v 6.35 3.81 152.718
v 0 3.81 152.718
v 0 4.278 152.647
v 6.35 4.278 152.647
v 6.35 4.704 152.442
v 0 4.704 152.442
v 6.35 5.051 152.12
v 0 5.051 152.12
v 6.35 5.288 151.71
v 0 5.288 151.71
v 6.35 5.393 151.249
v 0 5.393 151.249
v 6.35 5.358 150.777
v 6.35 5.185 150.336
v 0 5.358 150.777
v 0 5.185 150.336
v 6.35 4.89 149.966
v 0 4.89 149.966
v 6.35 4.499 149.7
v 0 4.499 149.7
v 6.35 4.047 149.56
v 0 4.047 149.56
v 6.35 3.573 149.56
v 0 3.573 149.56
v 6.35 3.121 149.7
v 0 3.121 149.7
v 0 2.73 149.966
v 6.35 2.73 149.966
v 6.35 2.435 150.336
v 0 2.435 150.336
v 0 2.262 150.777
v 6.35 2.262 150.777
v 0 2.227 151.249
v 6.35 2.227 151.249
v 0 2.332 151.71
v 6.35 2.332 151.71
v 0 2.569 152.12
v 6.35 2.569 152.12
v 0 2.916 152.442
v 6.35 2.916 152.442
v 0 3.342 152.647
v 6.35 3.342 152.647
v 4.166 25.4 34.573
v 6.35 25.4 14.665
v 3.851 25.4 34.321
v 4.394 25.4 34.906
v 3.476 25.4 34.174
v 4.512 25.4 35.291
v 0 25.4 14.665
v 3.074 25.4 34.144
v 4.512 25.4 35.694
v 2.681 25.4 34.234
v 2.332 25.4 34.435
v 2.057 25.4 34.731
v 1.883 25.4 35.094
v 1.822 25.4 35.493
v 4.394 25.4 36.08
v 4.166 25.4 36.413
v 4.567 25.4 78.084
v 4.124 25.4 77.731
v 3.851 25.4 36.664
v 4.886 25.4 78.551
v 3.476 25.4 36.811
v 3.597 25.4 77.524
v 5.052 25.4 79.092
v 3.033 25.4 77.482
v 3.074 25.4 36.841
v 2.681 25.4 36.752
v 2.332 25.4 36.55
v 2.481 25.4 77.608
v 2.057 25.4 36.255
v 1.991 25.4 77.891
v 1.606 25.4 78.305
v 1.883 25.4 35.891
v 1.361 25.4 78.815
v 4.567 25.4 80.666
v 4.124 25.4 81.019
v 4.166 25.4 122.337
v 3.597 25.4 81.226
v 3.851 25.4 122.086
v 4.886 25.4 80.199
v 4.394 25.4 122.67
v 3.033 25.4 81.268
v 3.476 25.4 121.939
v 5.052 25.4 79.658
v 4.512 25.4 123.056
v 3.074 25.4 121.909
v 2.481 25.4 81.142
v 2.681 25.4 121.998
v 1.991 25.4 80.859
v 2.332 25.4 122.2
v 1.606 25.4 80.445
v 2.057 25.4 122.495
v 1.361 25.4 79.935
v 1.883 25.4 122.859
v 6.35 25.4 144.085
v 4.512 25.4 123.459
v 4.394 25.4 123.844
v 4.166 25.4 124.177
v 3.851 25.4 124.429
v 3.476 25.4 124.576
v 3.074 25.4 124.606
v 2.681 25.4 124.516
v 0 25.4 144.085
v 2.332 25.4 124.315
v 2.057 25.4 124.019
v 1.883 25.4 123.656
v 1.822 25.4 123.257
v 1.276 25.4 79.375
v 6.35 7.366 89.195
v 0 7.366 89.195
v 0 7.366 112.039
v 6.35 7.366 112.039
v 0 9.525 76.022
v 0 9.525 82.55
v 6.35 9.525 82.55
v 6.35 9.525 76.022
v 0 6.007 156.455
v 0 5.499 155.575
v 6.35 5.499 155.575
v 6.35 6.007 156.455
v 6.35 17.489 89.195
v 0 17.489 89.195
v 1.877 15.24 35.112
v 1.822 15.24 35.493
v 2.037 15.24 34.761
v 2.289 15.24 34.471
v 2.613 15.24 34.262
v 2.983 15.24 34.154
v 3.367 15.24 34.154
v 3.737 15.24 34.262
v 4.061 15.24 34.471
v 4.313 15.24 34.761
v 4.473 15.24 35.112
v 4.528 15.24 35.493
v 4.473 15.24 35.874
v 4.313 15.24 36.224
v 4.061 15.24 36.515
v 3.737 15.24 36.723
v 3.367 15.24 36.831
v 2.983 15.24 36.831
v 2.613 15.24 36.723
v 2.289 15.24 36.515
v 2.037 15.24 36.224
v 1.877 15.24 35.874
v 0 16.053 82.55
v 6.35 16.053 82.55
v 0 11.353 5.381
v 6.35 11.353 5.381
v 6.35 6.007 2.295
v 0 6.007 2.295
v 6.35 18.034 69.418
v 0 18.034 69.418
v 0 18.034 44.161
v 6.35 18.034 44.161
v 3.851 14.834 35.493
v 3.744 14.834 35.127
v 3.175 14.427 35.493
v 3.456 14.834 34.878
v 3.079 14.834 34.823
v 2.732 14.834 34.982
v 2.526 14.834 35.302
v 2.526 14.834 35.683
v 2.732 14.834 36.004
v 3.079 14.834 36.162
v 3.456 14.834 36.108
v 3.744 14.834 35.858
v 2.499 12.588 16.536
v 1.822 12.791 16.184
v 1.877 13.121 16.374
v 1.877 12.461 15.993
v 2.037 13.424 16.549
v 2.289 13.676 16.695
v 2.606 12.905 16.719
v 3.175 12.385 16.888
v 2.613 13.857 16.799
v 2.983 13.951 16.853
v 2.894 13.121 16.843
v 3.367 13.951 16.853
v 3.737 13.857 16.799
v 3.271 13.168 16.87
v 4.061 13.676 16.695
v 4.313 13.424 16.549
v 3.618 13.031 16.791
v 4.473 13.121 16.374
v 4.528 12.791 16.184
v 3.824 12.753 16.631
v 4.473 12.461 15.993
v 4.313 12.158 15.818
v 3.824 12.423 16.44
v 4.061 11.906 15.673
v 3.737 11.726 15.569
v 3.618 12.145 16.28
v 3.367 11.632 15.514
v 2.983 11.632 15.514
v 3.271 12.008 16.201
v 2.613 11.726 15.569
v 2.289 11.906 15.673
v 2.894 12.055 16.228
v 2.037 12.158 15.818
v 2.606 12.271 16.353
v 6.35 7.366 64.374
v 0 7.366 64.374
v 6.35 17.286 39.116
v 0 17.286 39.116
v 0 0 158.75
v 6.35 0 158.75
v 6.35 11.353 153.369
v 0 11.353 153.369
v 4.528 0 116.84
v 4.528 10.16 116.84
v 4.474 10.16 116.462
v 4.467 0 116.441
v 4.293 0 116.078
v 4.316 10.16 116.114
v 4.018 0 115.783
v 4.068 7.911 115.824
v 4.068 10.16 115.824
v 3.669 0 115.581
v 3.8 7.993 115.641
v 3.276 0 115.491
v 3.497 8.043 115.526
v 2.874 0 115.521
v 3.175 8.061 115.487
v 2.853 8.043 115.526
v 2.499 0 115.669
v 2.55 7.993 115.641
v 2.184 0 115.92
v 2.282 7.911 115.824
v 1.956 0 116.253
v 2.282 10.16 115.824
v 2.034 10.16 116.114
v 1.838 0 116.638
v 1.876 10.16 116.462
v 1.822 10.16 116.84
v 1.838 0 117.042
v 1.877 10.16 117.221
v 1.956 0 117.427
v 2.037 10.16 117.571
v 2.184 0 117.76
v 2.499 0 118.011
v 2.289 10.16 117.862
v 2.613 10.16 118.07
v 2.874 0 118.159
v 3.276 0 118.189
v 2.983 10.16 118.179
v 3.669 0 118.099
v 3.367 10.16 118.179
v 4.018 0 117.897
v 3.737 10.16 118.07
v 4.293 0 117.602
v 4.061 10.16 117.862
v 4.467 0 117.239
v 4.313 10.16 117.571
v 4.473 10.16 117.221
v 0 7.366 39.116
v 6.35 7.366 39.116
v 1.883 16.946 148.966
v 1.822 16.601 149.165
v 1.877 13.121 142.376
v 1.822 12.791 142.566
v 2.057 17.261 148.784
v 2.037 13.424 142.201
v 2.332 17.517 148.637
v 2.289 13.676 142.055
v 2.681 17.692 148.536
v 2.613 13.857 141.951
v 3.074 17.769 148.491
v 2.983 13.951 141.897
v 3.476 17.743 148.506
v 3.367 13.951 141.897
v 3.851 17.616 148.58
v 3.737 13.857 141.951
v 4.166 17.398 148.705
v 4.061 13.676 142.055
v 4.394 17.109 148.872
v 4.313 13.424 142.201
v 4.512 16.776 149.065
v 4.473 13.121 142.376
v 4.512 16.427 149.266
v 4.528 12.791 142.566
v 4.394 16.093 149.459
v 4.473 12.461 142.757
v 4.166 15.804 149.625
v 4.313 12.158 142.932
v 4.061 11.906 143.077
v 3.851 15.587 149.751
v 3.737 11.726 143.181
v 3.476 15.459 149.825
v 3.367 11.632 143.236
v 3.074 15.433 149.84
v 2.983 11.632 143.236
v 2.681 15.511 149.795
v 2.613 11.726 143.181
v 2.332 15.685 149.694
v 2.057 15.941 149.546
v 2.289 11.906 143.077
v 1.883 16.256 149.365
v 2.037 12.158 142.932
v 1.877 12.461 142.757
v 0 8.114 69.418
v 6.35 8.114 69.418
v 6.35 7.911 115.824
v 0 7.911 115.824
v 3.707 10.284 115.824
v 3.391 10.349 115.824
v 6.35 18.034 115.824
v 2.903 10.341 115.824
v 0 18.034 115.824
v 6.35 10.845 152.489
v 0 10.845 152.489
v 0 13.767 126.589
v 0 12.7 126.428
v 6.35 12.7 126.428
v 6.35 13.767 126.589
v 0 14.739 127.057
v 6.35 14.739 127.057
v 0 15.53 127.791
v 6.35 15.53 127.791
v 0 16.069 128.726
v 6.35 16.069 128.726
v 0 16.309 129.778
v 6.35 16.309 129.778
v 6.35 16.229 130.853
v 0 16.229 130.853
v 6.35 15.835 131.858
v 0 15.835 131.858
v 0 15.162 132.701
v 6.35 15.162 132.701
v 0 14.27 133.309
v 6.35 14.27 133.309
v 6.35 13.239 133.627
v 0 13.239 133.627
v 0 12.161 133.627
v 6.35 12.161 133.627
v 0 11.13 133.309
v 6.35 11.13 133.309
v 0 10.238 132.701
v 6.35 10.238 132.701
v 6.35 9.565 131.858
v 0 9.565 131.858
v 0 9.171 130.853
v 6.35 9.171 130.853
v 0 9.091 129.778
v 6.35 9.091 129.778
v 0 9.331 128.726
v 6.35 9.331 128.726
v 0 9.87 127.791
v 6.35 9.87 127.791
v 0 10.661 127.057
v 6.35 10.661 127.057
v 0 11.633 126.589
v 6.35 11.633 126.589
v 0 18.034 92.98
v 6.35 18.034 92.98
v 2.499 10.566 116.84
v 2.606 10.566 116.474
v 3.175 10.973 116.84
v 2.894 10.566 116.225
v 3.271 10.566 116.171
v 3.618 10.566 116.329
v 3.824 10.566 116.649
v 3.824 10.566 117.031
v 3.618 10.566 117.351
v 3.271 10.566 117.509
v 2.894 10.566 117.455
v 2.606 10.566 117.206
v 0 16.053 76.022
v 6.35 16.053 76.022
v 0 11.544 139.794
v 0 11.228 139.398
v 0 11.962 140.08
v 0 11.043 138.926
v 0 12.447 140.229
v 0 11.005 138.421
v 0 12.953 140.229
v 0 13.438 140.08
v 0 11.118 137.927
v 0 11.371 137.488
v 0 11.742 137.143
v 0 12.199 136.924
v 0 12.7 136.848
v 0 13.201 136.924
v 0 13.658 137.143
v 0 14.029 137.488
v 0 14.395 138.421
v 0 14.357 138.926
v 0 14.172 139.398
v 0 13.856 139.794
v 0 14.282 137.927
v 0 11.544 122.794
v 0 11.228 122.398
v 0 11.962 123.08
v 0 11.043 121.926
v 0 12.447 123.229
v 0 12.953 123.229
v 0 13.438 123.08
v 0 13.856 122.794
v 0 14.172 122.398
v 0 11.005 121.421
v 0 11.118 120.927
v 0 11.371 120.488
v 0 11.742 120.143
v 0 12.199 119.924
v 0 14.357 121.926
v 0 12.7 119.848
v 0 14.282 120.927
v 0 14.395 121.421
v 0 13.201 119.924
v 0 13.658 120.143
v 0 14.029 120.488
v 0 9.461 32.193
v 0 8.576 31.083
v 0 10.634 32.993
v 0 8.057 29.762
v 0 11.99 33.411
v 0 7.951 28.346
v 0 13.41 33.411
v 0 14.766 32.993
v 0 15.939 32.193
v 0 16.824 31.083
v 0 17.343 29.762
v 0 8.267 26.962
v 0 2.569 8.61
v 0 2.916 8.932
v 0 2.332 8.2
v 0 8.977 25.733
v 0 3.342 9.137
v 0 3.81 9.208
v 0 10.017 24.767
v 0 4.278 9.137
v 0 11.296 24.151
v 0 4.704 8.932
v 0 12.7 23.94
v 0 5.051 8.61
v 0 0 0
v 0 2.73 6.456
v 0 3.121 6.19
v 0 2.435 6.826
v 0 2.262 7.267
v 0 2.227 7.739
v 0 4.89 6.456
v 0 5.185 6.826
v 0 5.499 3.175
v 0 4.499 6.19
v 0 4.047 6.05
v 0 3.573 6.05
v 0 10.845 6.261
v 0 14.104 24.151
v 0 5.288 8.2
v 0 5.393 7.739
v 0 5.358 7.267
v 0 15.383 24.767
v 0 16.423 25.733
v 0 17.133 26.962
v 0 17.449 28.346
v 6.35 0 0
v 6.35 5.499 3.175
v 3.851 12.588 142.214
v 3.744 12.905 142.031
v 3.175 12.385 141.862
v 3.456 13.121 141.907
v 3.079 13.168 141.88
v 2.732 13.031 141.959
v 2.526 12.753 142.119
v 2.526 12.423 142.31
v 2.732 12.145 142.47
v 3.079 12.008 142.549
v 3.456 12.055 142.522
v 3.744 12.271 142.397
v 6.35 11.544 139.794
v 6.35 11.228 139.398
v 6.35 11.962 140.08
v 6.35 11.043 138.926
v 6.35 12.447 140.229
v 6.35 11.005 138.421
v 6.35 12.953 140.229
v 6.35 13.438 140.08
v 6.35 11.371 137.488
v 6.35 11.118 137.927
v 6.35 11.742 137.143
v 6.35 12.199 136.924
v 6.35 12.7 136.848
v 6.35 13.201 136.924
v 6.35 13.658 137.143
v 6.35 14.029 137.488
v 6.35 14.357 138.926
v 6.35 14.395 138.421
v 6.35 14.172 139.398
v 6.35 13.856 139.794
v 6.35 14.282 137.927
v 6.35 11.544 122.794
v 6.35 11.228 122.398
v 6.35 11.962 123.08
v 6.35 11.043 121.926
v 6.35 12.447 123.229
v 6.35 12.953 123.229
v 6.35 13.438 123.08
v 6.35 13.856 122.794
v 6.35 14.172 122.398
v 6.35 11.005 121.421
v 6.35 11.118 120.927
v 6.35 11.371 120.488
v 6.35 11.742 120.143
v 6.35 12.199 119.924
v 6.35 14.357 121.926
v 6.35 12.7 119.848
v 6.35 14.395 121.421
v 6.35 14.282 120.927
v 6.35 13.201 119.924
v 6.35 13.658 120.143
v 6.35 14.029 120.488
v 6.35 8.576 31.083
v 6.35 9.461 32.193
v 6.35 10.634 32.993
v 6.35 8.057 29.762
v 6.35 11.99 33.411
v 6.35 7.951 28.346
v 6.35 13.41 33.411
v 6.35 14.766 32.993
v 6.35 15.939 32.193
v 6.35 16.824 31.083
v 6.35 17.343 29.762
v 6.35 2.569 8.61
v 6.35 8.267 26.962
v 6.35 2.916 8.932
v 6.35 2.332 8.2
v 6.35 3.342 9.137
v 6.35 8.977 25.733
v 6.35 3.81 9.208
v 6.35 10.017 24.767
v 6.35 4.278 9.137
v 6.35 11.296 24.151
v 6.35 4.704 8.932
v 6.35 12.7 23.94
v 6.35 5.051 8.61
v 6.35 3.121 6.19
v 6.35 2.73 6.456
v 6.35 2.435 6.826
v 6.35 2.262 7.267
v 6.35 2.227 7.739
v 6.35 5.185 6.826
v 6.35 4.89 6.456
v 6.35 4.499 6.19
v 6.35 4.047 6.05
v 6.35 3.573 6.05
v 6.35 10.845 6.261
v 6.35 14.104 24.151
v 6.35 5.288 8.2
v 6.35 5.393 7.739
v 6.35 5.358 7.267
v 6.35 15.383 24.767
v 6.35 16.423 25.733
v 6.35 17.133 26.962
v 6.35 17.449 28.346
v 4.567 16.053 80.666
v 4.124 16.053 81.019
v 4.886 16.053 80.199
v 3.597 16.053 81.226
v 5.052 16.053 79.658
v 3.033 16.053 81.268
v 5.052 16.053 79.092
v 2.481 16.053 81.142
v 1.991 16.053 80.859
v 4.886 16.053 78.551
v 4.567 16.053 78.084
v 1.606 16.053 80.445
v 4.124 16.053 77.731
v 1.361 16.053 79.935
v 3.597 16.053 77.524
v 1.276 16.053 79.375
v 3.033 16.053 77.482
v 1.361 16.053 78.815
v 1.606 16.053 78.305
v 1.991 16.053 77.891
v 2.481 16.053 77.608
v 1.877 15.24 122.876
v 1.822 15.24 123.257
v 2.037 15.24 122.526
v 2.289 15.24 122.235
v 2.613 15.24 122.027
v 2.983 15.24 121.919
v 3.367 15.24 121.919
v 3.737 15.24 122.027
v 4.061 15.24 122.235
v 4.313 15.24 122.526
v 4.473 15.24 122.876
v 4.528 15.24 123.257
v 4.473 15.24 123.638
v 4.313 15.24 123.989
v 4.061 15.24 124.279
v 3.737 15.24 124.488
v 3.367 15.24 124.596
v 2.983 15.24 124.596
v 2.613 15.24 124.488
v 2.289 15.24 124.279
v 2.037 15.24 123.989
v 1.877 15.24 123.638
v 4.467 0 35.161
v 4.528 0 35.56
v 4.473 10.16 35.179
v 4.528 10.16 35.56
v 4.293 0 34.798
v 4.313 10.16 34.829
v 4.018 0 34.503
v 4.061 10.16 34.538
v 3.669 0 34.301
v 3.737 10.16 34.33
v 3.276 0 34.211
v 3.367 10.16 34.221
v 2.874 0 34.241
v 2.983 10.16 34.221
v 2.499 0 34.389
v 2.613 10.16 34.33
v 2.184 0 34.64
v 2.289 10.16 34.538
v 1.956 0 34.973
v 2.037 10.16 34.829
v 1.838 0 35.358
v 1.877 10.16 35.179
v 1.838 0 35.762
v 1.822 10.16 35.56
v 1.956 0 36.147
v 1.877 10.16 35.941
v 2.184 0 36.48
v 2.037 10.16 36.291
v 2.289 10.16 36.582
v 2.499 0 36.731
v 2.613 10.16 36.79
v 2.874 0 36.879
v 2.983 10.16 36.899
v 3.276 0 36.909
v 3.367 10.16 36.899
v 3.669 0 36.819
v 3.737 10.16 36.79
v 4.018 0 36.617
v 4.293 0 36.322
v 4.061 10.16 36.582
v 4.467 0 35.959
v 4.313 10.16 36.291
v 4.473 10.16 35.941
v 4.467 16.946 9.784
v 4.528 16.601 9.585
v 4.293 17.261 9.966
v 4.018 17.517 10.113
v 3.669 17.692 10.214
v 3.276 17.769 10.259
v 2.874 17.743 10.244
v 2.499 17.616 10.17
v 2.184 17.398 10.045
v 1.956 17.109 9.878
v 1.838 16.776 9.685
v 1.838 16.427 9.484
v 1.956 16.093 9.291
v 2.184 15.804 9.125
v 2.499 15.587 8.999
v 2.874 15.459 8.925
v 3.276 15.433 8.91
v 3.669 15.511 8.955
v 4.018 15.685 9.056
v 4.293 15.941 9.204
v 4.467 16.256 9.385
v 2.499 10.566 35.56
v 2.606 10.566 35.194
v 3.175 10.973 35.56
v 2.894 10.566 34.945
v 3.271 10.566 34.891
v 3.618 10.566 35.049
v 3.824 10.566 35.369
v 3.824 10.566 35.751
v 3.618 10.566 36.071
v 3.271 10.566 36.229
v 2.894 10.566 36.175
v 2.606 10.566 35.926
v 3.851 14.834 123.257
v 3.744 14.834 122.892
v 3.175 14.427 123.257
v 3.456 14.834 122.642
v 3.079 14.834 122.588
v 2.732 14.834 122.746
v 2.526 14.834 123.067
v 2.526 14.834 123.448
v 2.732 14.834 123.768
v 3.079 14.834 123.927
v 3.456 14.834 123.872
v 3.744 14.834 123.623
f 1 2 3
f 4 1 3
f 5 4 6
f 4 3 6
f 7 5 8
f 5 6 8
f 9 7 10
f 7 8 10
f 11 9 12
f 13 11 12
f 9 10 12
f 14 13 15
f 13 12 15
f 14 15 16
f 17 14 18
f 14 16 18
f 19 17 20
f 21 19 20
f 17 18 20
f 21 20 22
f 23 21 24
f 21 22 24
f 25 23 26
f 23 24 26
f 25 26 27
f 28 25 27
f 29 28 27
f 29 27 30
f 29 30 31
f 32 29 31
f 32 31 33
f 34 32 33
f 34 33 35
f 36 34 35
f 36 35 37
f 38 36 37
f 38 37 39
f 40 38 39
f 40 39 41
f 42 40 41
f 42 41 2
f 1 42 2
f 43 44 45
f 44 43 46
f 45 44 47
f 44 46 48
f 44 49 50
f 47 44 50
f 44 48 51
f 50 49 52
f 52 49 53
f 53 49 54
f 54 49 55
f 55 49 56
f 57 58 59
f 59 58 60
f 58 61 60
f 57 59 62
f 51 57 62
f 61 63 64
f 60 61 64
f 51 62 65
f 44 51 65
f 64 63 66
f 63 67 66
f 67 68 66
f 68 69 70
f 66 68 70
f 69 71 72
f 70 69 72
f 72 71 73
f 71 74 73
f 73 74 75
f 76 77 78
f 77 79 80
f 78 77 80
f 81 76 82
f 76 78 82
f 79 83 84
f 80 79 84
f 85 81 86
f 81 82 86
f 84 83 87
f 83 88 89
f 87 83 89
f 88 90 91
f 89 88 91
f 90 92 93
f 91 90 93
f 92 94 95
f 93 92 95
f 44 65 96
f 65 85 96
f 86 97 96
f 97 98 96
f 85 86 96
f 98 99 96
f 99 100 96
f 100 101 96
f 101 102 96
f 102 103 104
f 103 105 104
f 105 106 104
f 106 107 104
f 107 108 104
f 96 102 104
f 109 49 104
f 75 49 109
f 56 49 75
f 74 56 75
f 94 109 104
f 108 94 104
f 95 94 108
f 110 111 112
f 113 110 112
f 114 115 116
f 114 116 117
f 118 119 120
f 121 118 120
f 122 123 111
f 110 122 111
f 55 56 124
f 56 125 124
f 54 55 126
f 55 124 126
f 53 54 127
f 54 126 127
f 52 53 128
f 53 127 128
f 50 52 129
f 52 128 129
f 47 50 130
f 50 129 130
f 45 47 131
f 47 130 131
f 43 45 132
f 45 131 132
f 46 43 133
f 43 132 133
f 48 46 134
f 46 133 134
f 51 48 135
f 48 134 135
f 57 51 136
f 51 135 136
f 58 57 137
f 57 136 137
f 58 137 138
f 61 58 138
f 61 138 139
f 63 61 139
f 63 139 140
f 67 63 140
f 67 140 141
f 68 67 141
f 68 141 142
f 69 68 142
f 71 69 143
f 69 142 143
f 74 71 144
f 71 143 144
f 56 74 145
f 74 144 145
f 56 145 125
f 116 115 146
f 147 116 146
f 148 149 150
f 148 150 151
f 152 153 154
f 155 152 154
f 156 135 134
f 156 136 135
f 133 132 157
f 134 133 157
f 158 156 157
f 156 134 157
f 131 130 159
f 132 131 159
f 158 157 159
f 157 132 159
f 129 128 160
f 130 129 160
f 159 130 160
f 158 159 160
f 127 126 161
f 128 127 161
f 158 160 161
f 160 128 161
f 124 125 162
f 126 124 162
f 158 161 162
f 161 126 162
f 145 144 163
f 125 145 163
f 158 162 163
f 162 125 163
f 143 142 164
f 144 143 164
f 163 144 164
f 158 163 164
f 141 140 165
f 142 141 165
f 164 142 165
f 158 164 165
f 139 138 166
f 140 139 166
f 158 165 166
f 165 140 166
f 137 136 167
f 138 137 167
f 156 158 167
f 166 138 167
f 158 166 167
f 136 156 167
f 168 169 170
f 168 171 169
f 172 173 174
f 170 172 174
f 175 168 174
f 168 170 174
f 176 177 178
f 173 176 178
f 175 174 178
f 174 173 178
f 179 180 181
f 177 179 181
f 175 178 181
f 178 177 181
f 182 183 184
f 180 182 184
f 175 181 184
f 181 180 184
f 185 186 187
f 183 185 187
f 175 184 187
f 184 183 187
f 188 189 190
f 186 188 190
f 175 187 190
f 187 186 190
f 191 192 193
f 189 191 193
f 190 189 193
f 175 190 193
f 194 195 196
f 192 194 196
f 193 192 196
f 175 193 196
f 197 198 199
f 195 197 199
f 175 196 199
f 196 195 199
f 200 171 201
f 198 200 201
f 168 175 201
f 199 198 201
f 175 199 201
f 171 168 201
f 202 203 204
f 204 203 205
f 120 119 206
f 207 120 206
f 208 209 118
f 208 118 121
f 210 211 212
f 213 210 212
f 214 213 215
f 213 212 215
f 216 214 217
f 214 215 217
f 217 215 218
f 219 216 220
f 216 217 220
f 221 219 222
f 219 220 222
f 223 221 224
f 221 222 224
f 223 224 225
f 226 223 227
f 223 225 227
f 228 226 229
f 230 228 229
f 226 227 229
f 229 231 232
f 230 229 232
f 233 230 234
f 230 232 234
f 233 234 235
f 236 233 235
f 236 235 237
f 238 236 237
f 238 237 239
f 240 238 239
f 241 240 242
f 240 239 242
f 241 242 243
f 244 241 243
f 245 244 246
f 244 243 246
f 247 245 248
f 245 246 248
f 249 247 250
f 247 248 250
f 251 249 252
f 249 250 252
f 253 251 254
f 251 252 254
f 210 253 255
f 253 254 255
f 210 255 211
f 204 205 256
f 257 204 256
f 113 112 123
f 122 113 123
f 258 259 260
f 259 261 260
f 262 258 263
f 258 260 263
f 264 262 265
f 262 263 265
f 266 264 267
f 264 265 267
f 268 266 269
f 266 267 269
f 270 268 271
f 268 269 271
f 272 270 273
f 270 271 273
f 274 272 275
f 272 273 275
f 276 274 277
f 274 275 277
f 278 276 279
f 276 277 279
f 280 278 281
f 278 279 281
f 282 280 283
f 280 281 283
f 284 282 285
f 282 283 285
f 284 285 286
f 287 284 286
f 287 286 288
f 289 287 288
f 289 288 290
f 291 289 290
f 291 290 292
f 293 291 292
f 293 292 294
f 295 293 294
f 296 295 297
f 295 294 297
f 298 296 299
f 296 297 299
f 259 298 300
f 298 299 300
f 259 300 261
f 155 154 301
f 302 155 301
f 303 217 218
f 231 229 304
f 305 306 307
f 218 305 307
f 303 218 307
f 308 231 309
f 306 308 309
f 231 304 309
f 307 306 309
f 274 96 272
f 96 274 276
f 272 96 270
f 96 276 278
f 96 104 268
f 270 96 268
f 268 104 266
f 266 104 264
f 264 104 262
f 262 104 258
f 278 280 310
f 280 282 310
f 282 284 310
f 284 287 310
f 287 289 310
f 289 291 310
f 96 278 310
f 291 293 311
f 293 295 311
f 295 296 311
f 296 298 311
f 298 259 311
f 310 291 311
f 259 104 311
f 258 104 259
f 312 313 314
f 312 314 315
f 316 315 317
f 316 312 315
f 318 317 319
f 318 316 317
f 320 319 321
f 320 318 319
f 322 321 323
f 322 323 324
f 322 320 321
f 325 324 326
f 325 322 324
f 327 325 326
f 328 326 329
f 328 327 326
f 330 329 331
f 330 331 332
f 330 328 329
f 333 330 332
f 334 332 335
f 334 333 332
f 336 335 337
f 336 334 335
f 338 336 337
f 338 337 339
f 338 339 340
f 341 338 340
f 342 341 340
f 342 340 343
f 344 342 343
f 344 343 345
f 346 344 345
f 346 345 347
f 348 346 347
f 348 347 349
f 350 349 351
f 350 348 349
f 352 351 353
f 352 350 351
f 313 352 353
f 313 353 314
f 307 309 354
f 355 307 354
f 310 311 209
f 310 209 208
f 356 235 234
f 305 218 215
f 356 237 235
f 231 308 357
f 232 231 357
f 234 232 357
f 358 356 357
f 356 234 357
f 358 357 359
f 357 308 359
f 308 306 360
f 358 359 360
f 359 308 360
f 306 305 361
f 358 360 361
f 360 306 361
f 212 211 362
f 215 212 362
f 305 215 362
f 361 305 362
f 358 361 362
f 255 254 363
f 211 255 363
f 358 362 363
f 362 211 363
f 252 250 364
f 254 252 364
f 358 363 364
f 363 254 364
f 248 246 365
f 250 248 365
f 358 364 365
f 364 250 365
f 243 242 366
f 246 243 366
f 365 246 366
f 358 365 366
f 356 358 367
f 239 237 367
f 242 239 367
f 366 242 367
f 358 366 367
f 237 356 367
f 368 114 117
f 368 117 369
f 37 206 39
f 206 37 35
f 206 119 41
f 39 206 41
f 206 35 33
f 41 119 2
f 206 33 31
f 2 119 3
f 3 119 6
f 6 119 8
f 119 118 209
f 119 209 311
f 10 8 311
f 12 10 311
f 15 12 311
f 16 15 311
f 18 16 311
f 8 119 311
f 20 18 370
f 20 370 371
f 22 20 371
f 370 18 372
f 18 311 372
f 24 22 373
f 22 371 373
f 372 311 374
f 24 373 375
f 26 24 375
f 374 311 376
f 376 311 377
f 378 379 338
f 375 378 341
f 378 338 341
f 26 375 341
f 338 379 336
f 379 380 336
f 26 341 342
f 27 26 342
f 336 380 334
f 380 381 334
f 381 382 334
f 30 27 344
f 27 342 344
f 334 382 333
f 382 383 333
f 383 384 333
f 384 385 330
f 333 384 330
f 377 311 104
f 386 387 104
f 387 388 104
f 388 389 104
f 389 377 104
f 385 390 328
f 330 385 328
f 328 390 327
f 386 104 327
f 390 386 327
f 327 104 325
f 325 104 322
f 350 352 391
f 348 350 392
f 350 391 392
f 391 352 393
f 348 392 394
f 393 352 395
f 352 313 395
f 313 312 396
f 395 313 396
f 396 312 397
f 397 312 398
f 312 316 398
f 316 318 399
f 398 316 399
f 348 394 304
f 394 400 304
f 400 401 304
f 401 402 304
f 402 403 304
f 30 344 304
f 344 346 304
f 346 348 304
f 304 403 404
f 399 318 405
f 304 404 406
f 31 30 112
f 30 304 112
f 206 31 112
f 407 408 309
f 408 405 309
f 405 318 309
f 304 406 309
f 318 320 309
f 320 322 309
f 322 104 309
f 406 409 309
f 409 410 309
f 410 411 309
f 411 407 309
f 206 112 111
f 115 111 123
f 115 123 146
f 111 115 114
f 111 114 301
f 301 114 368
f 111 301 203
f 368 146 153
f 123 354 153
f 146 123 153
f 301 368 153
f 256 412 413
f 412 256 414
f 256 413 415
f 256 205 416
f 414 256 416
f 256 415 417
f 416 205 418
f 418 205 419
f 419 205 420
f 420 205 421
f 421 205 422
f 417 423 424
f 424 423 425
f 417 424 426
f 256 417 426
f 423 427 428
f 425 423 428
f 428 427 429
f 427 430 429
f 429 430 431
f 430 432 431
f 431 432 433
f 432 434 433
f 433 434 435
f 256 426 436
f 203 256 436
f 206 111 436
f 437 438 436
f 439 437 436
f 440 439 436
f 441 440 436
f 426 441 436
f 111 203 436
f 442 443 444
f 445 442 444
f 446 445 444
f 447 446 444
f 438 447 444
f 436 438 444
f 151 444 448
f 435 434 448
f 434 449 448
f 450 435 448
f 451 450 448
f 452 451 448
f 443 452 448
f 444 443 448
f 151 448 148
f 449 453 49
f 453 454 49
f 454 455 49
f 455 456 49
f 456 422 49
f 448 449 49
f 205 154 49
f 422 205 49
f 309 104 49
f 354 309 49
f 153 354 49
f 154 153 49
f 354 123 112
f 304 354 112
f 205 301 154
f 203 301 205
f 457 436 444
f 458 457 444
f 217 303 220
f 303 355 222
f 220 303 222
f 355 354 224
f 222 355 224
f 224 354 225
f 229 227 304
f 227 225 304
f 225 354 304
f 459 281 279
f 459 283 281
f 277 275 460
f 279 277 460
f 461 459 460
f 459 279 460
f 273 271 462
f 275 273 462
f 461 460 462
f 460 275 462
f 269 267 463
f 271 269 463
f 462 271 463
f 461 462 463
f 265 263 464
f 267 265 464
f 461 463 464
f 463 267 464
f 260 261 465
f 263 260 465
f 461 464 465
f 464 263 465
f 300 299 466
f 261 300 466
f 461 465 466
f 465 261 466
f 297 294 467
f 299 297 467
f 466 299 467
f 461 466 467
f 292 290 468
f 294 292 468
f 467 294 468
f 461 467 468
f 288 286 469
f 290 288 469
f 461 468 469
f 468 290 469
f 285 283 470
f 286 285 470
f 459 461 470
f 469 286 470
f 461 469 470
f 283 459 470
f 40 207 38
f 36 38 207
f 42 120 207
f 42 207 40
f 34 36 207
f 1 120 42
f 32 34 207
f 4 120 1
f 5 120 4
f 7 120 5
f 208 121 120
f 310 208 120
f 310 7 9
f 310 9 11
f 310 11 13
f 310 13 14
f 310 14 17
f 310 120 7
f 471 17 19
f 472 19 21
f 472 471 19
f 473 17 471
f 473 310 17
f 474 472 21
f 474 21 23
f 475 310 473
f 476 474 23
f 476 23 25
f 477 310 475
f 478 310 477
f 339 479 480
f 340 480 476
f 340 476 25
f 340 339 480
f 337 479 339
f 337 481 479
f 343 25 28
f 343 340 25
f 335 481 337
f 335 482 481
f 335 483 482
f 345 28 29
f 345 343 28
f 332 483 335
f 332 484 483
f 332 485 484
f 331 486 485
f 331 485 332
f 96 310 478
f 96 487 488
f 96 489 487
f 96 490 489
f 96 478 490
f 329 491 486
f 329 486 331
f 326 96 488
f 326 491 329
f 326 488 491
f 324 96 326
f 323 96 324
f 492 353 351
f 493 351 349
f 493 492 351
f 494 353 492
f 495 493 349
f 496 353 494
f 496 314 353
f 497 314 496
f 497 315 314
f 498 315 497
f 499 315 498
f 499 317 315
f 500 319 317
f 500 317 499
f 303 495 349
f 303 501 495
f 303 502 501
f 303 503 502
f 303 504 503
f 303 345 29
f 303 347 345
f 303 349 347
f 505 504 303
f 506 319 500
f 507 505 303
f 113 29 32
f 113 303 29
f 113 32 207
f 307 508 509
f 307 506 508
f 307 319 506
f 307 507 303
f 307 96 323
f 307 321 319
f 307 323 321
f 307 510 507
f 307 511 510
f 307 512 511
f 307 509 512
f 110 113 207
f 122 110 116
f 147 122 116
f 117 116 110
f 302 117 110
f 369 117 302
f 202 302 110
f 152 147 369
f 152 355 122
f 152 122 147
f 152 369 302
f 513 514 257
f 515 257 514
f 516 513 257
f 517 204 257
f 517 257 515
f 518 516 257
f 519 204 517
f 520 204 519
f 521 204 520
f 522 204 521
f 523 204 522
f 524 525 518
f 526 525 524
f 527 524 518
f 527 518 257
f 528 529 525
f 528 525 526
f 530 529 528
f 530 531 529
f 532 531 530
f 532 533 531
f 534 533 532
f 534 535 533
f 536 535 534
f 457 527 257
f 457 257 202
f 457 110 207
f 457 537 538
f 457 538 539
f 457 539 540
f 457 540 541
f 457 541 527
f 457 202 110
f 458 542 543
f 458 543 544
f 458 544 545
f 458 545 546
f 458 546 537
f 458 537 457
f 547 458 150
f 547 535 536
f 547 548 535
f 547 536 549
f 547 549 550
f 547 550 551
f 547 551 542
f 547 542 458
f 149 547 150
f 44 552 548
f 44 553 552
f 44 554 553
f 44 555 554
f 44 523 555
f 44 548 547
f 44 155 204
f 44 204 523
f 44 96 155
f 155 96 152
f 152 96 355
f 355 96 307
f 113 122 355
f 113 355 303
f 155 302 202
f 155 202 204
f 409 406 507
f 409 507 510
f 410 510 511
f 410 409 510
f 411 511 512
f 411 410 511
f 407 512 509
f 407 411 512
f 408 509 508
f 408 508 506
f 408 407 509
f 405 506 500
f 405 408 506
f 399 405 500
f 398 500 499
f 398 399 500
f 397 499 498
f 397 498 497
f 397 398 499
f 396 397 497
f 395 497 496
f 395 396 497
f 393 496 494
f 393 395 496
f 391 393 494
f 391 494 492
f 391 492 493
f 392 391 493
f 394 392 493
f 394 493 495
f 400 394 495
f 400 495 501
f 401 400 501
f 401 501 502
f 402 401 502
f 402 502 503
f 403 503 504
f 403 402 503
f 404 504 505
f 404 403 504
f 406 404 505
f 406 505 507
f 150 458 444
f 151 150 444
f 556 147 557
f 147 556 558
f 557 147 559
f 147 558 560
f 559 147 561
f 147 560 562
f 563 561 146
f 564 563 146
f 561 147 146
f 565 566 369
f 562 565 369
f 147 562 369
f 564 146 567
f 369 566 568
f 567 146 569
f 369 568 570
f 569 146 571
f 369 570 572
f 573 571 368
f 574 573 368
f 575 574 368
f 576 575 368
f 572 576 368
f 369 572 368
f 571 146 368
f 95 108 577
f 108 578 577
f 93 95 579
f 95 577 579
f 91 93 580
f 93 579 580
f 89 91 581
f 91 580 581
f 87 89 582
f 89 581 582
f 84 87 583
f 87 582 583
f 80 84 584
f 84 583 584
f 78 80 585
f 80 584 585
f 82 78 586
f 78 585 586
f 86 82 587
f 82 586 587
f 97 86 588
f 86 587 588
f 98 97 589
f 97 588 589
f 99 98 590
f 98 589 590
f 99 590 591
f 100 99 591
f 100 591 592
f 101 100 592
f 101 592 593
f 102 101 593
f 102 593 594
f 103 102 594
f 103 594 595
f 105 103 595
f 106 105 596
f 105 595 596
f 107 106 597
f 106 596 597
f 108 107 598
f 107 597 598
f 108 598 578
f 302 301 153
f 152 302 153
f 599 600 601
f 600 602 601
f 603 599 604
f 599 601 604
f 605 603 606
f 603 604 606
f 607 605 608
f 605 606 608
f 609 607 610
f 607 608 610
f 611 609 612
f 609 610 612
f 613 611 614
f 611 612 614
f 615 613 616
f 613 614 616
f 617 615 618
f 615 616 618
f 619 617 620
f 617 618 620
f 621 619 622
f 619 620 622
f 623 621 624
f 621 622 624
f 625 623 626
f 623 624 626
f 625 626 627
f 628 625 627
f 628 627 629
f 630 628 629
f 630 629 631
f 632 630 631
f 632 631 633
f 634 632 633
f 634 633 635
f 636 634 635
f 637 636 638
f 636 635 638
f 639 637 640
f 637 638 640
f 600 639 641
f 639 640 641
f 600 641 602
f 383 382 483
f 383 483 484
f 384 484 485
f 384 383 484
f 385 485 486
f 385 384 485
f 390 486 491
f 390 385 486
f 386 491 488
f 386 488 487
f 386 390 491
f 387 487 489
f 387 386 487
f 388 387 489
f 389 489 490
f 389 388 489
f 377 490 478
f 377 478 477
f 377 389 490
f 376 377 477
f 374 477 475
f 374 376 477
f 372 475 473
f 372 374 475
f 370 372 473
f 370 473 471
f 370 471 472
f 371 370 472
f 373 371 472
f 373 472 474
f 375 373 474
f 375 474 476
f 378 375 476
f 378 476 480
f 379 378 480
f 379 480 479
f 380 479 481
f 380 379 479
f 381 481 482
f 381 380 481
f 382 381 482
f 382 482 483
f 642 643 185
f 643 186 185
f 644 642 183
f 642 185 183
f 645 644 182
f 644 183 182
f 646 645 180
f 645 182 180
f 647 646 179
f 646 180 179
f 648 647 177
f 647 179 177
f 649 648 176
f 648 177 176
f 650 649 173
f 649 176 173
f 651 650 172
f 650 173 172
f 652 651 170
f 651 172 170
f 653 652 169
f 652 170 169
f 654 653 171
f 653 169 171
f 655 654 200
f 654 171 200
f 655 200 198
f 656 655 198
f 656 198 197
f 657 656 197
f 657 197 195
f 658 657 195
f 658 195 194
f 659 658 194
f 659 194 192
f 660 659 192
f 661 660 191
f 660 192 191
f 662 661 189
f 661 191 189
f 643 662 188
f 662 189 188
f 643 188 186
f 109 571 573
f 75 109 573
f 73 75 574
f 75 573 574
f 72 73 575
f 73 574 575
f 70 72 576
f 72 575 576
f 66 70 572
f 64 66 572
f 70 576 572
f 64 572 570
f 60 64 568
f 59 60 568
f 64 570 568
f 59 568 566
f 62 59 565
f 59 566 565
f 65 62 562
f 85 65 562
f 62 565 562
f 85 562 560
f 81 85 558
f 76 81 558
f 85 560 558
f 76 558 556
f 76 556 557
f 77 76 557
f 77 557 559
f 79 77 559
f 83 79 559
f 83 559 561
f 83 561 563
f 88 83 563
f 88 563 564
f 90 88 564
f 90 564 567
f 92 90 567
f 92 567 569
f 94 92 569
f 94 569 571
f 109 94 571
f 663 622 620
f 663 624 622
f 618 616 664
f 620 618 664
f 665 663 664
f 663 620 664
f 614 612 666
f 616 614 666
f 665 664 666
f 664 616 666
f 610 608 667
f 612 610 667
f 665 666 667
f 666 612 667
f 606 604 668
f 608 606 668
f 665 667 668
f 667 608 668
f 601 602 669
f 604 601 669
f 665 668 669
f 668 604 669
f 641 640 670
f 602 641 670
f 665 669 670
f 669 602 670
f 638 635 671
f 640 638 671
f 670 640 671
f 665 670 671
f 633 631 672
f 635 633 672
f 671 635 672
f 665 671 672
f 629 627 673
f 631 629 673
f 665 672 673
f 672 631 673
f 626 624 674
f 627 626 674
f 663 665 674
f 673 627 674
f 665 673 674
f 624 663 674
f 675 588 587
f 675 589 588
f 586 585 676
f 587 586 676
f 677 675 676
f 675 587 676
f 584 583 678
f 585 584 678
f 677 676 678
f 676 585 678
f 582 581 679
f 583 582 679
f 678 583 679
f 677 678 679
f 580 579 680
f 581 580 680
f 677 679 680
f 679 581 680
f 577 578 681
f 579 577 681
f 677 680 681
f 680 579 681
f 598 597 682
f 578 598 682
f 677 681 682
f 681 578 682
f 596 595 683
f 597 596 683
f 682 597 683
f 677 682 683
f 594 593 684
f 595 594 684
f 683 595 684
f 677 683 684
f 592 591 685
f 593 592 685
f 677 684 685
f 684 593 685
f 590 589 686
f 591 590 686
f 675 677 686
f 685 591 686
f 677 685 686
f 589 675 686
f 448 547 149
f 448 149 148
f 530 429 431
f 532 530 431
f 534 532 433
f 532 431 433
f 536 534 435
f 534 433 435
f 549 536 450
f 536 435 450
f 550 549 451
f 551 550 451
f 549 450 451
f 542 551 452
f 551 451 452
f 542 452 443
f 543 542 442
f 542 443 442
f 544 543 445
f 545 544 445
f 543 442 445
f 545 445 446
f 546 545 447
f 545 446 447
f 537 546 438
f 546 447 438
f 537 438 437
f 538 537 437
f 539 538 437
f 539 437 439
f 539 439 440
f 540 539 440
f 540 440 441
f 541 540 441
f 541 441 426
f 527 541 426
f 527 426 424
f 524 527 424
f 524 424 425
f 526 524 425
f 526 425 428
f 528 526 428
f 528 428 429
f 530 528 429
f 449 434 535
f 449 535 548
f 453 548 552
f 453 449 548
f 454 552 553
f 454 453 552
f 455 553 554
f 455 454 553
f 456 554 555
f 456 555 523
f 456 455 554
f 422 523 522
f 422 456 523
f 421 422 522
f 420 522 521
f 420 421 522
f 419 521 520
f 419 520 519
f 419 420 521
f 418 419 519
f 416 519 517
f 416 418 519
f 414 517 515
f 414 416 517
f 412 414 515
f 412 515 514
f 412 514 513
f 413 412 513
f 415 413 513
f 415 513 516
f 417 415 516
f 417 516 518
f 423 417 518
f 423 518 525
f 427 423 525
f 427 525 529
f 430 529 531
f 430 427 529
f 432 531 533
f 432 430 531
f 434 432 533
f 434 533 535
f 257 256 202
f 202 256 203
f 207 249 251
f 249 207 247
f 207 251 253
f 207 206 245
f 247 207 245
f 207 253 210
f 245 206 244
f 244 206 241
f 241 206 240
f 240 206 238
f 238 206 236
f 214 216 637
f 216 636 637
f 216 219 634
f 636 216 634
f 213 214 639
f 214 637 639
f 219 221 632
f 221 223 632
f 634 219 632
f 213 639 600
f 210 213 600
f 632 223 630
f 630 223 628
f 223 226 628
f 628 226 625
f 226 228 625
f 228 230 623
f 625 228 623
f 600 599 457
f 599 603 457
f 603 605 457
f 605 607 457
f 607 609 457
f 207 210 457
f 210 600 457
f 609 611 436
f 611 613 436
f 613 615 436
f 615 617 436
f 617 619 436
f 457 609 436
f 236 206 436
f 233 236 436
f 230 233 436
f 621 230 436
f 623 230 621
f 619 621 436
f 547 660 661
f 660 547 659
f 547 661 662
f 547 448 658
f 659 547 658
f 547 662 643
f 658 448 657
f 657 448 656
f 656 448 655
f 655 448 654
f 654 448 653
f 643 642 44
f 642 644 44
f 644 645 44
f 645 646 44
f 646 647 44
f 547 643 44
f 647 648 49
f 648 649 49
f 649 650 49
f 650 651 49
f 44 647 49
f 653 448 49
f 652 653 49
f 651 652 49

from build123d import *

# Parameters (mm, degrees)
SKETCH1_R                     = 3.6195
SKETCH1_R_2                   = 4.7625
SKETCH1_R_3                   = 1.6999966
SKETCH1_W                     = 6.5278
SKETCH1_H                     = 6.5278
BOSS_EXTRUDE1_DEPTH           = 6.35
TAP_DRILL_FOR_6_32_TAP4_D     = 2.7051
TAP_DRILL_FOR_6_32_TAP4_DEPTH = 10.16
TAP_DRILL_FOR_6_32_TAP4_TIP   = 0.81269403
TAP_DRILL_FOR_6_32_TAP3_D     = 2.7051
TAP_DRILL_FOR_6_32_TAP3_DEPTH = 10.16
TAP_DRILL_FOR_6_32_TAP3_TIP   = 0.81269403
SKETCH11_W                    = 6.35
SKETCH11_H                    = 6.1722
BOSS_EXTRUDE2_DEPTH           = 1.016
SKETCH12_W                    = 6.35
SKETCH12_H                    = 6.1722
BOSS_EXTRUDE3_DEPTH           = 1.016
TAP_DRILL_FOR_6_32_TAP1_D     = 2.7051
TAP_DRILL_FOR_6_32_TAP1_DEPTH = 7.62
TAP_DRILL_FOR_6_32_TAP1_TIP   = 0.81269403
TAP_DRILL_FOR_6_32_TAP2_D     = 2.7051
TAP_DRILL_FOR_6_32_TAP2_DEPTH = 7.62
TAP_DRILL_FOR_6_32_TAP2_TIP   = 0.81269403
F_6_CLEARANCE_HOLE1_D         = 3.7973
F_6_CLEARANCE_HOLE1_DEPTH     = 12.7
F_6_CLEARANCE_HOLE1_TIP       = 1.140824014
SKETCH19_R                    = 1.5875
CUT_EXTRUDE1_DEPTH            = 161.894515133
CUT_EXTRUDE2_DEPTH            = 161.894515133


with BuildPart() as part:
    # Sketch1 → Boss-Extrude1 (new body)
    with BuildSketch(Plane(origin=(0, 0, 0), x_dir=(0, 0, -1), z_dir=(1, 0, 0))):
        Polygon((0, 0), (-14.664696837, 25.4), (-144.085303163, 25.4), (-158.75, 0), align=None)
        with Locations((-130.048, 12.7)):
            Circle(SKETCH1_R, mode=Mode.SUBTRACT)
        with Locations((-28.702, 12.7)):
            Circle(SKETCH1_R_2, mode=Mode.SUBTRACT)
        with Locations((-121.5479916, 12.7)):
            Circle(SKETCH1_R_3, mode=Mode.SUBTRACT)
        with Locations((-138.5480084, 12.7)):
            Circle(SKETCH1_R_3, mode=Mode.SUBTRACT)
        with Locations((-79.2861, 12.7889)):
            Rectangle(SKETCH1_W, SKETCH1_H, mode=Mode.SUBTRACT)
    extrude(amount=BOSS_EXTRUDE1_DEPTH)

    # Tap Drill for #6-32 Tap4
    with Locations(Plane(origin=(0, 25.4, 0), x_dir=(1, 0, 0), z_dir=(0, 1, 0))):
        with Locations((3.175, -123.257303163), (3.175, -35.492696837)):
            Hole(TAP_DRILL_FOR_6_32_TAP4_D / 2, depth=TAP_DRILL_FOR_6_32_TAP4_DEPTH)
            with Locations((0, 0, -(TAP_DRILL_FOR_6_32_TAP4_DEPTH + TAP_DRILL_FOR_6_32_TAP4_TIP / 2))):  # 118° drill point
                Cone(0, TAP_DRILL_FOR_6_32_TAP4_D / 2, TAP_DRILL_FOR_6_32_TAP4_TIP, mode=Mode.SUBTRACT)

    # Tap Drill for #6-32 Tap3
    with Locations(Plane(origin=(0, 0, 0), x_dir=(-1, 0, 0), z_dir=(0, -1, 0))):
        with Locations((-3.175, -116.84), (-3.175, -35.56)):
            Hole(TAP_DRILL_FOR_6_32_TAP3_D / 2, depth=TAP_DRILL_FOR_6_32_TAP3_DEPTH)
            with Locations((0, 0, -(TAP_DRILL_FOR_6_32_TAP3_DEPTH + TAP_DRILL_FOR_6_32_TAP3_TIP / 2))):  # 118° drill point
                Cone(0, TAP_DRILL_FOR_6_32_TAP3_D / 2, TAP_DRILL_FOR_6_32_TAP3_TIP, mode=Mode.SUBTRACT)

    # Sketch11 → Boss-Extrude2 (add)
    with BuildSketch(Plane(origin=(0, 68.740766425, 119.0625), x_dir=(1, 0, 0), z_dir=(0, 0.5000000000000038, 0.8660254037844366))):
        with Locations((3.175, -69.9389)):
            Rectangle(SKETCH11_W, SKETCH11_H)
    extrude(amount=BOSS_EXTRUDE2_DEPTH)

    # Sketch12 → Boss-Extrude3 (add)
    with BuildSketch(Plane(origin=(0, 0, 0), x_dir=(-1, 0, 0), z_dir=(0, 0.499999999999998, -0.8660254037844397))):
        with Locations((-3.175, 9.4361)):
            Rectangle(SKETCH12_W, SKETCH12_H)
    extrude(amount=BOSS_EXTRUDE3_DEPTH)

    # Tap Drill for #6-32 Tap1
    with Locations(Plane(origin=(0, 68.740766425, 119.0625), x_dir=(1, 0, 0), z_dir=(0, 0.5000000000000038, 0.8660254037844366))):
        with Locations((3.175, -60.205606325)):
            Hole(TAP_DRILL_FOR_6_32_TAP1_D / 2, depth=TAP_DRILL_FOR_6_32_TAP1_DEPTH)
            with Locations((0, 0, -(TAP_DRILL_FOR_6_32_TAP1_DEPTH + TAP_DRILL_FOR_6_32_TAP1_TIP / 2))):  # 118° drill point
                Cone(0, TAP_DRILL_FOR_6_32_TAP1_D / 2, TAP_DRILL_FOR_6_32_TAP1_TIP, mode=Mode.SUBTRACT)

    # Tap Drill for #6-32 Tap2
    with Locations(Plane(origin=(0, 0, 0), x_dir=(-1, 0, 0), z_dir=(0, 0.49999999999999806, -0.8660254037844398))):
        with Locations((-3.175, 19.169393675)):
            Hole(TAP_DRILL_FOR_6_32_TAP2_D / 2, depth=TAP_DRILL_FOR_6_32_TAP2_DEPTH)
            with Locations((0, 0, -(TAP_DRILL_FOR_6_32_TAP2_DEPTH + TAP_DRILL_FOR_6_32_TAP2_TIP / 2))):  # 118° drill point
                Cone(0, TAP_DRILL_FOR_6_32_TAP2_D / 2, TAP_DRILL_FOR_6_32_TAP2_TIP, mode=Mode.SUBTRACT)

    # #6 Clearance Hole1
    with Locations(Plane(origin=(0, 25.4, 0), x_dir=(1, 0, 0), z_dir=(0, 1, 0))):
        with Locations((3.175, -79.375)):
            Hole(F_6_CLEARANCE_HOLE1_D / 2, depth=F_6_CLEARANCE_HOLE1_DEPTH)
            with Locations((0, 0, -(F_6_CLEARANCE_HOLE1_DEPTH + F_6_CLEARANCE_HOLE1_TIP / 2))):  # 118° drill point
                Cone(0, F_6_CLEARANCE_HOLE1_D / 2, F_6_CLEARANCE_HOLE1_TIP, mode=Mode.SUBTRACT)

    # Sketch19 → Cut-Extrude1 (cut, through all)
    with BuildSketch(Plane.ZY):
        with Locations((151.13, 3.81)):
            Circle(SKETCH19_R)
        with Locations((7.62, 3.81)):
            Circle(SKETCH19_R)
    extrude(amount=-CUT_EXTRUDE1_DEPTH, mode=Mode.SUBTRACT)

    # Sketch20 → Cut-Extrude2 (cut, through all)
    with BuildSketch(Plane.ZY):
        Polygon((64.373574984, 7.366), (39.116, 17.286492924), (39.116, 7.366), align=None)
        Polygon((69.4182, 18.034), (44.160625016, 18.034), (69.4182, 8.113507076), align=None)
        Polygon((112.039277302, 7.366), (89.195364135, 17.488514329), (89.195364135, 7.366), align=None)
        Polygon((115.824, 18.034), (92.980086833, 18.034), (115.824, 7.911485671), align=None)
    extrude(amount=-CUT_EXTRUDE2_DEPTH, mode=Mode.SUBTRACT)


solid = part.part
